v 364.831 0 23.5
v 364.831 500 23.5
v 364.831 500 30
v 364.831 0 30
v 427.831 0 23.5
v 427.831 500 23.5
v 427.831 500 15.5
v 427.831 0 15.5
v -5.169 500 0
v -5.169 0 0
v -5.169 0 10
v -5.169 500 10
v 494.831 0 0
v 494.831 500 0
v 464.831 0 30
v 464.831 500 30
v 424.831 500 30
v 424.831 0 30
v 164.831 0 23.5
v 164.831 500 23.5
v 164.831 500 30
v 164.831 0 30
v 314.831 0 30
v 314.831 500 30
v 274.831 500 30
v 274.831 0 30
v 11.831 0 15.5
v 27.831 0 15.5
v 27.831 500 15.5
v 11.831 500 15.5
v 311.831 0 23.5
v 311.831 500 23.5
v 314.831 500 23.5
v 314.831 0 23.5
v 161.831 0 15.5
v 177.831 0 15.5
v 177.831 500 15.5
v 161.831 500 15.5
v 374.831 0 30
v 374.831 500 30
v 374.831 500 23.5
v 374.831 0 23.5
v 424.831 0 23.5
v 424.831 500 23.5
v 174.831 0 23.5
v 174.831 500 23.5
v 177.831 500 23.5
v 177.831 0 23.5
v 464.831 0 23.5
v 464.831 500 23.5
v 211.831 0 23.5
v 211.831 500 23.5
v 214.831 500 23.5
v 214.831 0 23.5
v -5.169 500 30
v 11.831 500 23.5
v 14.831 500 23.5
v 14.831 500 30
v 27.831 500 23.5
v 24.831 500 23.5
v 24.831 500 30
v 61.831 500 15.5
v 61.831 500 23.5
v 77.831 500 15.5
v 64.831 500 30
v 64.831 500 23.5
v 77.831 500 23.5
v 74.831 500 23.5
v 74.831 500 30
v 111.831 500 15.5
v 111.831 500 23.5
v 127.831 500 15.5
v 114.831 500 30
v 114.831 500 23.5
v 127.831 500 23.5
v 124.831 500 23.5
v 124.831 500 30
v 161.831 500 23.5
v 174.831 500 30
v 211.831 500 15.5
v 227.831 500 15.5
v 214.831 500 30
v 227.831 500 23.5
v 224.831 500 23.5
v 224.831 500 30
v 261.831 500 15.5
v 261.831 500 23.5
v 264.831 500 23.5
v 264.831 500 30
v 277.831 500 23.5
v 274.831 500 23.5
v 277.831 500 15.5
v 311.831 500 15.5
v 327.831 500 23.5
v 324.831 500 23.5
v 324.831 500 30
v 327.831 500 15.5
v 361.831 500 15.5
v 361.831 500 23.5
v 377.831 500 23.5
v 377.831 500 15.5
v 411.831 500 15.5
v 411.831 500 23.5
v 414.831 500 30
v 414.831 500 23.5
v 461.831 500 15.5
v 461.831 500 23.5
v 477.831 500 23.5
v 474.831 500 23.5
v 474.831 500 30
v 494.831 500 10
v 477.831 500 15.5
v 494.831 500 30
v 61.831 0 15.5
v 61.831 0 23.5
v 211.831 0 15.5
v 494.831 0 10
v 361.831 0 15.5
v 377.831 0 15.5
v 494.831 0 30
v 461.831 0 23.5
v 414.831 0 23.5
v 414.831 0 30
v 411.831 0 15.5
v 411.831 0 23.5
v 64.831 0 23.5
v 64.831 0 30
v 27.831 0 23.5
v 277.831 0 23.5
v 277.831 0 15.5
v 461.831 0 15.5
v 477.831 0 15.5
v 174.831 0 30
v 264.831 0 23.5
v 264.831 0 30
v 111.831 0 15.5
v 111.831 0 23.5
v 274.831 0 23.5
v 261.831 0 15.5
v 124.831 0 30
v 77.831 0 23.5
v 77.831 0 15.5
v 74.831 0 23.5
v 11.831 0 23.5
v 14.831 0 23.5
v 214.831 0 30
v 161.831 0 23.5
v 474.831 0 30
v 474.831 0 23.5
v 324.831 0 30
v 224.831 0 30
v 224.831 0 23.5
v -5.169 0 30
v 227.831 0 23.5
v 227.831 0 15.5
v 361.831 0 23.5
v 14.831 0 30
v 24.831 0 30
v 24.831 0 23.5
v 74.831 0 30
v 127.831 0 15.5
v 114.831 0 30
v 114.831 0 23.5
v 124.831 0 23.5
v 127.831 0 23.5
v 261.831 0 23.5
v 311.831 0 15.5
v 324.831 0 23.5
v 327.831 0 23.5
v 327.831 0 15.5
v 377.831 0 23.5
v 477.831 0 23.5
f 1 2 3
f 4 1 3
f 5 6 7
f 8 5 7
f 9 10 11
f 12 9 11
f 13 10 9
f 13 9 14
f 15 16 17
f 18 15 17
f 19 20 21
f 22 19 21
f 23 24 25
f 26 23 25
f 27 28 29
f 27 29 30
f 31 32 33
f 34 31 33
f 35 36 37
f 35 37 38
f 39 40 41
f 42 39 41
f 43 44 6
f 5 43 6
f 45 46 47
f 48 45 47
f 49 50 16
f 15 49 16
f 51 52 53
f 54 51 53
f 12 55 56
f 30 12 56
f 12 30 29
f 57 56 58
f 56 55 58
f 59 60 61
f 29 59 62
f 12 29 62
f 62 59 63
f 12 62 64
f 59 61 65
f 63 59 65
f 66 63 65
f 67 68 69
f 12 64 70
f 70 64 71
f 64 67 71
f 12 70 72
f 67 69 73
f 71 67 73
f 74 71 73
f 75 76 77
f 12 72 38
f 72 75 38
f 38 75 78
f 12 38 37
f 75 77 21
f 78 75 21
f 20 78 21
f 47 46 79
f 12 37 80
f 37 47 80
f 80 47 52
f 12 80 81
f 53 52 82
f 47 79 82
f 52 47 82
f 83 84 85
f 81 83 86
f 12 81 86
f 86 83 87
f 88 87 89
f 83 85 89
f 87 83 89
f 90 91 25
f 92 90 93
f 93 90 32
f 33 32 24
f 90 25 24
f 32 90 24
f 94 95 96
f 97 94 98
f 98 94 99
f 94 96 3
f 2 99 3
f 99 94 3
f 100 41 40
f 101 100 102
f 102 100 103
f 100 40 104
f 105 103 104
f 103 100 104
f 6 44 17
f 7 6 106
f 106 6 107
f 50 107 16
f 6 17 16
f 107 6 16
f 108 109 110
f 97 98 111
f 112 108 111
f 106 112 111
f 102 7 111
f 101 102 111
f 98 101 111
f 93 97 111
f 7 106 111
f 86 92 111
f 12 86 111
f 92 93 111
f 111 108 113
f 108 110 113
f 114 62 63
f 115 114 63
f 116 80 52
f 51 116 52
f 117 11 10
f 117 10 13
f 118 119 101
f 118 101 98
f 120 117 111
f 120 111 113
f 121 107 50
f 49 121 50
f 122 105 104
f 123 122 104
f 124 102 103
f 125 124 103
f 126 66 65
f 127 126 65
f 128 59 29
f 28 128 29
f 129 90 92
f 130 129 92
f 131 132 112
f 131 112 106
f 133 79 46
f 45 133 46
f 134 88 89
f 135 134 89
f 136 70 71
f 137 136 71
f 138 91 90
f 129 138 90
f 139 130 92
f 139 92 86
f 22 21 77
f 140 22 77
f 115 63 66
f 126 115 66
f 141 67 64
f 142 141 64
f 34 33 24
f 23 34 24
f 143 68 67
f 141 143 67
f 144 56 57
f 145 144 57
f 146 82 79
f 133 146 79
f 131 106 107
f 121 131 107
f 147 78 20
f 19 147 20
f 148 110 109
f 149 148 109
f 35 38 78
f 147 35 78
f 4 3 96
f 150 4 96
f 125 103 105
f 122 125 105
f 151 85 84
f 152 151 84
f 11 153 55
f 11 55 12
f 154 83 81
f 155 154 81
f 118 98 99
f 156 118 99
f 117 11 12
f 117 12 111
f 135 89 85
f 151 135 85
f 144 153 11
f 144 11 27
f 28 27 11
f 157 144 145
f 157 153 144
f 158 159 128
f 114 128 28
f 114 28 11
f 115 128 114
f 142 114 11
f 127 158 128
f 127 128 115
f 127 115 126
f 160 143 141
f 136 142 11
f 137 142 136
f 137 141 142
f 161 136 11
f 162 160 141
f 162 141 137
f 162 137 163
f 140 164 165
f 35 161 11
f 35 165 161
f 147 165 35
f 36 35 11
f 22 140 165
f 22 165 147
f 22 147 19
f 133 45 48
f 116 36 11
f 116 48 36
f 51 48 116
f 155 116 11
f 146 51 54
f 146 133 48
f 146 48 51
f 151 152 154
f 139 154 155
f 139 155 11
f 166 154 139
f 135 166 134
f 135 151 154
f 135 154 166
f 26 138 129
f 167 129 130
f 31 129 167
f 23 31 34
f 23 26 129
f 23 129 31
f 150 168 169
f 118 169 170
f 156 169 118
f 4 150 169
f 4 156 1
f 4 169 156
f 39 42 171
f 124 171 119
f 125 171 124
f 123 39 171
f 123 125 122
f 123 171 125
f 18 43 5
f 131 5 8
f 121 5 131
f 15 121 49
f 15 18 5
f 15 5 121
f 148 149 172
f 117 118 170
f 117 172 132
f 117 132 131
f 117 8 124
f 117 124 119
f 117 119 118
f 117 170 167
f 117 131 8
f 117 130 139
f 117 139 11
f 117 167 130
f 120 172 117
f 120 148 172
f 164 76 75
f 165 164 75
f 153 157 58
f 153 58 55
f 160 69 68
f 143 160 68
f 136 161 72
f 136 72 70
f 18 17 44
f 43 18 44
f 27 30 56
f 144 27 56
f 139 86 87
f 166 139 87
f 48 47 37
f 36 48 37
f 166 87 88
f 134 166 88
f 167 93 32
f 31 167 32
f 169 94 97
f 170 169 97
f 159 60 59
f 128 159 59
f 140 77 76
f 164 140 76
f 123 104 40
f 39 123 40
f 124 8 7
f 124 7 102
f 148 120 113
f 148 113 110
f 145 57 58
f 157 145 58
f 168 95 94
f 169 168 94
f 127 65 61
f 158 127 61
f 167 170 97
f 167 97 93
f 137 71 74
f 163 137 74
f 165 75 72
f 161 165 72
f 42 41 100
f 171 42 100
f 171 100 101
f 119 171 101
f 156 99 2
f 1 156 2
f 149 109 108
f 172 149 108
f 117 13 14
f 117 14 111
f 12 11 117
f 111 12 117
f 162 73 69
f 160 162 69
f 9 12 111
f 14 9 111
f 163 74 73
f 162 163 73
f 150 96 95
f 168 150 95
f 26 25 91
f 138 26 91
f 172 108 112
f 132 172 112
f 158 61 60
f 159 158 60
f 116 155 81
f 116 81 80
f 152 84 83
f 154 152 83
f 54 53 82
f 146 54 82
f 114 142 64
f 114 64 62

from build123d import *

# Parameters (mm, degrees)
F1_DEPTH = 500
F0_W     = 500
F0_H     = 10
F2_DEPTH = 500


with BuildPart() as f1:
    # F0 (on Front) → F1 (new body)
    with BuildSketch(Plane.XZ):
        Polygon((-5.169302, 30), (-5.169302, 10), (494.830698, 10), (494.830698, 30), (474.830698, 30), (474.830698, 23.5), (477.830698, 23.5), (477.830698, 15.5), (461.830698, 15.5), (461.830698, 23.5), (464.830698, 23.5), (464.830698, 30), (424.830698, 30), (424.830698, 23.5), (427.830698, 23.5), (427.830698, 15.5), (411.830698, 15.5), (411.830698, 23.5), (414.830698, 23.5), (414.830698, 30), (374.830698, 30), (374.830698, 23.5), (377.830698, 23.5), (377.830698, 15.5), (361.830698, 15.5), (361.830698, 23.5), (364.830698, 23.5), (364.830698, 30), (324.830698, 30), (324.830698, 23.5), (327.830698, 23.5), (327.830698, 15.5), (311.830698, 15.5), (311.830698, 23.5), (314.830698, 23.5), (314.830698, 30), (274.830698, 30), (274.830698, 23.5), (277.830698, 23.5), (277.830698, 15.5), (261.830698, 15.5), (261.830698, 23.5), (264.830698, 23.5), (264.830698, 30), (224.830698, 30), (224.830698, 23.5), (227.830698, 23.5), (227.830698, 15.5), (211.830698, 15.5), (211.830698, 23.5), (214.830698, 23.5), (214.830698, 30), (174.830698, 30), (174.830698, 23.5), (177.830698, 23.5), (177.830698, 15.5), (161.830698, 15.5), (161.830698, 23.5), (164.830698, 23.5), (164.830698, 30), (124.830698, 30), (124.830698, 23.5), (127.830698, 23.5), (127.830698, 15.5), (111.830698, 15.5), (111.830698, 23.5), (114.830698, 23.5), (114.830698, 30), (74.830698, 30), (74.830698, 23.5), (77.830698, 23.5), (77.830698, 15.5), (61.830698, 15.5), (61.830698, 23.5), (64.830698, 23.5), (64.830698, 30), (24.830698, 30), (24.830698, 23.5), (27.830698, 23.5), (27.830698, 15.5), (11.830698, 15.5), (11.830698, 23.5), (14.830698, 23.5), (14.830698, 30), align=None)
    extrude(amount=-F1_DEPTH)


with BuildPart() as f2:
    # F0 (on Front) → F2 (new body)
    with BuildSketch(Plane.XZ):
        with Locations((244.830698, 5)):
            Rectangle(F0_W, F0_H)
    extrude(amount=-F2_DEPTH)


solid = Compound([f1.part, f2.part])
